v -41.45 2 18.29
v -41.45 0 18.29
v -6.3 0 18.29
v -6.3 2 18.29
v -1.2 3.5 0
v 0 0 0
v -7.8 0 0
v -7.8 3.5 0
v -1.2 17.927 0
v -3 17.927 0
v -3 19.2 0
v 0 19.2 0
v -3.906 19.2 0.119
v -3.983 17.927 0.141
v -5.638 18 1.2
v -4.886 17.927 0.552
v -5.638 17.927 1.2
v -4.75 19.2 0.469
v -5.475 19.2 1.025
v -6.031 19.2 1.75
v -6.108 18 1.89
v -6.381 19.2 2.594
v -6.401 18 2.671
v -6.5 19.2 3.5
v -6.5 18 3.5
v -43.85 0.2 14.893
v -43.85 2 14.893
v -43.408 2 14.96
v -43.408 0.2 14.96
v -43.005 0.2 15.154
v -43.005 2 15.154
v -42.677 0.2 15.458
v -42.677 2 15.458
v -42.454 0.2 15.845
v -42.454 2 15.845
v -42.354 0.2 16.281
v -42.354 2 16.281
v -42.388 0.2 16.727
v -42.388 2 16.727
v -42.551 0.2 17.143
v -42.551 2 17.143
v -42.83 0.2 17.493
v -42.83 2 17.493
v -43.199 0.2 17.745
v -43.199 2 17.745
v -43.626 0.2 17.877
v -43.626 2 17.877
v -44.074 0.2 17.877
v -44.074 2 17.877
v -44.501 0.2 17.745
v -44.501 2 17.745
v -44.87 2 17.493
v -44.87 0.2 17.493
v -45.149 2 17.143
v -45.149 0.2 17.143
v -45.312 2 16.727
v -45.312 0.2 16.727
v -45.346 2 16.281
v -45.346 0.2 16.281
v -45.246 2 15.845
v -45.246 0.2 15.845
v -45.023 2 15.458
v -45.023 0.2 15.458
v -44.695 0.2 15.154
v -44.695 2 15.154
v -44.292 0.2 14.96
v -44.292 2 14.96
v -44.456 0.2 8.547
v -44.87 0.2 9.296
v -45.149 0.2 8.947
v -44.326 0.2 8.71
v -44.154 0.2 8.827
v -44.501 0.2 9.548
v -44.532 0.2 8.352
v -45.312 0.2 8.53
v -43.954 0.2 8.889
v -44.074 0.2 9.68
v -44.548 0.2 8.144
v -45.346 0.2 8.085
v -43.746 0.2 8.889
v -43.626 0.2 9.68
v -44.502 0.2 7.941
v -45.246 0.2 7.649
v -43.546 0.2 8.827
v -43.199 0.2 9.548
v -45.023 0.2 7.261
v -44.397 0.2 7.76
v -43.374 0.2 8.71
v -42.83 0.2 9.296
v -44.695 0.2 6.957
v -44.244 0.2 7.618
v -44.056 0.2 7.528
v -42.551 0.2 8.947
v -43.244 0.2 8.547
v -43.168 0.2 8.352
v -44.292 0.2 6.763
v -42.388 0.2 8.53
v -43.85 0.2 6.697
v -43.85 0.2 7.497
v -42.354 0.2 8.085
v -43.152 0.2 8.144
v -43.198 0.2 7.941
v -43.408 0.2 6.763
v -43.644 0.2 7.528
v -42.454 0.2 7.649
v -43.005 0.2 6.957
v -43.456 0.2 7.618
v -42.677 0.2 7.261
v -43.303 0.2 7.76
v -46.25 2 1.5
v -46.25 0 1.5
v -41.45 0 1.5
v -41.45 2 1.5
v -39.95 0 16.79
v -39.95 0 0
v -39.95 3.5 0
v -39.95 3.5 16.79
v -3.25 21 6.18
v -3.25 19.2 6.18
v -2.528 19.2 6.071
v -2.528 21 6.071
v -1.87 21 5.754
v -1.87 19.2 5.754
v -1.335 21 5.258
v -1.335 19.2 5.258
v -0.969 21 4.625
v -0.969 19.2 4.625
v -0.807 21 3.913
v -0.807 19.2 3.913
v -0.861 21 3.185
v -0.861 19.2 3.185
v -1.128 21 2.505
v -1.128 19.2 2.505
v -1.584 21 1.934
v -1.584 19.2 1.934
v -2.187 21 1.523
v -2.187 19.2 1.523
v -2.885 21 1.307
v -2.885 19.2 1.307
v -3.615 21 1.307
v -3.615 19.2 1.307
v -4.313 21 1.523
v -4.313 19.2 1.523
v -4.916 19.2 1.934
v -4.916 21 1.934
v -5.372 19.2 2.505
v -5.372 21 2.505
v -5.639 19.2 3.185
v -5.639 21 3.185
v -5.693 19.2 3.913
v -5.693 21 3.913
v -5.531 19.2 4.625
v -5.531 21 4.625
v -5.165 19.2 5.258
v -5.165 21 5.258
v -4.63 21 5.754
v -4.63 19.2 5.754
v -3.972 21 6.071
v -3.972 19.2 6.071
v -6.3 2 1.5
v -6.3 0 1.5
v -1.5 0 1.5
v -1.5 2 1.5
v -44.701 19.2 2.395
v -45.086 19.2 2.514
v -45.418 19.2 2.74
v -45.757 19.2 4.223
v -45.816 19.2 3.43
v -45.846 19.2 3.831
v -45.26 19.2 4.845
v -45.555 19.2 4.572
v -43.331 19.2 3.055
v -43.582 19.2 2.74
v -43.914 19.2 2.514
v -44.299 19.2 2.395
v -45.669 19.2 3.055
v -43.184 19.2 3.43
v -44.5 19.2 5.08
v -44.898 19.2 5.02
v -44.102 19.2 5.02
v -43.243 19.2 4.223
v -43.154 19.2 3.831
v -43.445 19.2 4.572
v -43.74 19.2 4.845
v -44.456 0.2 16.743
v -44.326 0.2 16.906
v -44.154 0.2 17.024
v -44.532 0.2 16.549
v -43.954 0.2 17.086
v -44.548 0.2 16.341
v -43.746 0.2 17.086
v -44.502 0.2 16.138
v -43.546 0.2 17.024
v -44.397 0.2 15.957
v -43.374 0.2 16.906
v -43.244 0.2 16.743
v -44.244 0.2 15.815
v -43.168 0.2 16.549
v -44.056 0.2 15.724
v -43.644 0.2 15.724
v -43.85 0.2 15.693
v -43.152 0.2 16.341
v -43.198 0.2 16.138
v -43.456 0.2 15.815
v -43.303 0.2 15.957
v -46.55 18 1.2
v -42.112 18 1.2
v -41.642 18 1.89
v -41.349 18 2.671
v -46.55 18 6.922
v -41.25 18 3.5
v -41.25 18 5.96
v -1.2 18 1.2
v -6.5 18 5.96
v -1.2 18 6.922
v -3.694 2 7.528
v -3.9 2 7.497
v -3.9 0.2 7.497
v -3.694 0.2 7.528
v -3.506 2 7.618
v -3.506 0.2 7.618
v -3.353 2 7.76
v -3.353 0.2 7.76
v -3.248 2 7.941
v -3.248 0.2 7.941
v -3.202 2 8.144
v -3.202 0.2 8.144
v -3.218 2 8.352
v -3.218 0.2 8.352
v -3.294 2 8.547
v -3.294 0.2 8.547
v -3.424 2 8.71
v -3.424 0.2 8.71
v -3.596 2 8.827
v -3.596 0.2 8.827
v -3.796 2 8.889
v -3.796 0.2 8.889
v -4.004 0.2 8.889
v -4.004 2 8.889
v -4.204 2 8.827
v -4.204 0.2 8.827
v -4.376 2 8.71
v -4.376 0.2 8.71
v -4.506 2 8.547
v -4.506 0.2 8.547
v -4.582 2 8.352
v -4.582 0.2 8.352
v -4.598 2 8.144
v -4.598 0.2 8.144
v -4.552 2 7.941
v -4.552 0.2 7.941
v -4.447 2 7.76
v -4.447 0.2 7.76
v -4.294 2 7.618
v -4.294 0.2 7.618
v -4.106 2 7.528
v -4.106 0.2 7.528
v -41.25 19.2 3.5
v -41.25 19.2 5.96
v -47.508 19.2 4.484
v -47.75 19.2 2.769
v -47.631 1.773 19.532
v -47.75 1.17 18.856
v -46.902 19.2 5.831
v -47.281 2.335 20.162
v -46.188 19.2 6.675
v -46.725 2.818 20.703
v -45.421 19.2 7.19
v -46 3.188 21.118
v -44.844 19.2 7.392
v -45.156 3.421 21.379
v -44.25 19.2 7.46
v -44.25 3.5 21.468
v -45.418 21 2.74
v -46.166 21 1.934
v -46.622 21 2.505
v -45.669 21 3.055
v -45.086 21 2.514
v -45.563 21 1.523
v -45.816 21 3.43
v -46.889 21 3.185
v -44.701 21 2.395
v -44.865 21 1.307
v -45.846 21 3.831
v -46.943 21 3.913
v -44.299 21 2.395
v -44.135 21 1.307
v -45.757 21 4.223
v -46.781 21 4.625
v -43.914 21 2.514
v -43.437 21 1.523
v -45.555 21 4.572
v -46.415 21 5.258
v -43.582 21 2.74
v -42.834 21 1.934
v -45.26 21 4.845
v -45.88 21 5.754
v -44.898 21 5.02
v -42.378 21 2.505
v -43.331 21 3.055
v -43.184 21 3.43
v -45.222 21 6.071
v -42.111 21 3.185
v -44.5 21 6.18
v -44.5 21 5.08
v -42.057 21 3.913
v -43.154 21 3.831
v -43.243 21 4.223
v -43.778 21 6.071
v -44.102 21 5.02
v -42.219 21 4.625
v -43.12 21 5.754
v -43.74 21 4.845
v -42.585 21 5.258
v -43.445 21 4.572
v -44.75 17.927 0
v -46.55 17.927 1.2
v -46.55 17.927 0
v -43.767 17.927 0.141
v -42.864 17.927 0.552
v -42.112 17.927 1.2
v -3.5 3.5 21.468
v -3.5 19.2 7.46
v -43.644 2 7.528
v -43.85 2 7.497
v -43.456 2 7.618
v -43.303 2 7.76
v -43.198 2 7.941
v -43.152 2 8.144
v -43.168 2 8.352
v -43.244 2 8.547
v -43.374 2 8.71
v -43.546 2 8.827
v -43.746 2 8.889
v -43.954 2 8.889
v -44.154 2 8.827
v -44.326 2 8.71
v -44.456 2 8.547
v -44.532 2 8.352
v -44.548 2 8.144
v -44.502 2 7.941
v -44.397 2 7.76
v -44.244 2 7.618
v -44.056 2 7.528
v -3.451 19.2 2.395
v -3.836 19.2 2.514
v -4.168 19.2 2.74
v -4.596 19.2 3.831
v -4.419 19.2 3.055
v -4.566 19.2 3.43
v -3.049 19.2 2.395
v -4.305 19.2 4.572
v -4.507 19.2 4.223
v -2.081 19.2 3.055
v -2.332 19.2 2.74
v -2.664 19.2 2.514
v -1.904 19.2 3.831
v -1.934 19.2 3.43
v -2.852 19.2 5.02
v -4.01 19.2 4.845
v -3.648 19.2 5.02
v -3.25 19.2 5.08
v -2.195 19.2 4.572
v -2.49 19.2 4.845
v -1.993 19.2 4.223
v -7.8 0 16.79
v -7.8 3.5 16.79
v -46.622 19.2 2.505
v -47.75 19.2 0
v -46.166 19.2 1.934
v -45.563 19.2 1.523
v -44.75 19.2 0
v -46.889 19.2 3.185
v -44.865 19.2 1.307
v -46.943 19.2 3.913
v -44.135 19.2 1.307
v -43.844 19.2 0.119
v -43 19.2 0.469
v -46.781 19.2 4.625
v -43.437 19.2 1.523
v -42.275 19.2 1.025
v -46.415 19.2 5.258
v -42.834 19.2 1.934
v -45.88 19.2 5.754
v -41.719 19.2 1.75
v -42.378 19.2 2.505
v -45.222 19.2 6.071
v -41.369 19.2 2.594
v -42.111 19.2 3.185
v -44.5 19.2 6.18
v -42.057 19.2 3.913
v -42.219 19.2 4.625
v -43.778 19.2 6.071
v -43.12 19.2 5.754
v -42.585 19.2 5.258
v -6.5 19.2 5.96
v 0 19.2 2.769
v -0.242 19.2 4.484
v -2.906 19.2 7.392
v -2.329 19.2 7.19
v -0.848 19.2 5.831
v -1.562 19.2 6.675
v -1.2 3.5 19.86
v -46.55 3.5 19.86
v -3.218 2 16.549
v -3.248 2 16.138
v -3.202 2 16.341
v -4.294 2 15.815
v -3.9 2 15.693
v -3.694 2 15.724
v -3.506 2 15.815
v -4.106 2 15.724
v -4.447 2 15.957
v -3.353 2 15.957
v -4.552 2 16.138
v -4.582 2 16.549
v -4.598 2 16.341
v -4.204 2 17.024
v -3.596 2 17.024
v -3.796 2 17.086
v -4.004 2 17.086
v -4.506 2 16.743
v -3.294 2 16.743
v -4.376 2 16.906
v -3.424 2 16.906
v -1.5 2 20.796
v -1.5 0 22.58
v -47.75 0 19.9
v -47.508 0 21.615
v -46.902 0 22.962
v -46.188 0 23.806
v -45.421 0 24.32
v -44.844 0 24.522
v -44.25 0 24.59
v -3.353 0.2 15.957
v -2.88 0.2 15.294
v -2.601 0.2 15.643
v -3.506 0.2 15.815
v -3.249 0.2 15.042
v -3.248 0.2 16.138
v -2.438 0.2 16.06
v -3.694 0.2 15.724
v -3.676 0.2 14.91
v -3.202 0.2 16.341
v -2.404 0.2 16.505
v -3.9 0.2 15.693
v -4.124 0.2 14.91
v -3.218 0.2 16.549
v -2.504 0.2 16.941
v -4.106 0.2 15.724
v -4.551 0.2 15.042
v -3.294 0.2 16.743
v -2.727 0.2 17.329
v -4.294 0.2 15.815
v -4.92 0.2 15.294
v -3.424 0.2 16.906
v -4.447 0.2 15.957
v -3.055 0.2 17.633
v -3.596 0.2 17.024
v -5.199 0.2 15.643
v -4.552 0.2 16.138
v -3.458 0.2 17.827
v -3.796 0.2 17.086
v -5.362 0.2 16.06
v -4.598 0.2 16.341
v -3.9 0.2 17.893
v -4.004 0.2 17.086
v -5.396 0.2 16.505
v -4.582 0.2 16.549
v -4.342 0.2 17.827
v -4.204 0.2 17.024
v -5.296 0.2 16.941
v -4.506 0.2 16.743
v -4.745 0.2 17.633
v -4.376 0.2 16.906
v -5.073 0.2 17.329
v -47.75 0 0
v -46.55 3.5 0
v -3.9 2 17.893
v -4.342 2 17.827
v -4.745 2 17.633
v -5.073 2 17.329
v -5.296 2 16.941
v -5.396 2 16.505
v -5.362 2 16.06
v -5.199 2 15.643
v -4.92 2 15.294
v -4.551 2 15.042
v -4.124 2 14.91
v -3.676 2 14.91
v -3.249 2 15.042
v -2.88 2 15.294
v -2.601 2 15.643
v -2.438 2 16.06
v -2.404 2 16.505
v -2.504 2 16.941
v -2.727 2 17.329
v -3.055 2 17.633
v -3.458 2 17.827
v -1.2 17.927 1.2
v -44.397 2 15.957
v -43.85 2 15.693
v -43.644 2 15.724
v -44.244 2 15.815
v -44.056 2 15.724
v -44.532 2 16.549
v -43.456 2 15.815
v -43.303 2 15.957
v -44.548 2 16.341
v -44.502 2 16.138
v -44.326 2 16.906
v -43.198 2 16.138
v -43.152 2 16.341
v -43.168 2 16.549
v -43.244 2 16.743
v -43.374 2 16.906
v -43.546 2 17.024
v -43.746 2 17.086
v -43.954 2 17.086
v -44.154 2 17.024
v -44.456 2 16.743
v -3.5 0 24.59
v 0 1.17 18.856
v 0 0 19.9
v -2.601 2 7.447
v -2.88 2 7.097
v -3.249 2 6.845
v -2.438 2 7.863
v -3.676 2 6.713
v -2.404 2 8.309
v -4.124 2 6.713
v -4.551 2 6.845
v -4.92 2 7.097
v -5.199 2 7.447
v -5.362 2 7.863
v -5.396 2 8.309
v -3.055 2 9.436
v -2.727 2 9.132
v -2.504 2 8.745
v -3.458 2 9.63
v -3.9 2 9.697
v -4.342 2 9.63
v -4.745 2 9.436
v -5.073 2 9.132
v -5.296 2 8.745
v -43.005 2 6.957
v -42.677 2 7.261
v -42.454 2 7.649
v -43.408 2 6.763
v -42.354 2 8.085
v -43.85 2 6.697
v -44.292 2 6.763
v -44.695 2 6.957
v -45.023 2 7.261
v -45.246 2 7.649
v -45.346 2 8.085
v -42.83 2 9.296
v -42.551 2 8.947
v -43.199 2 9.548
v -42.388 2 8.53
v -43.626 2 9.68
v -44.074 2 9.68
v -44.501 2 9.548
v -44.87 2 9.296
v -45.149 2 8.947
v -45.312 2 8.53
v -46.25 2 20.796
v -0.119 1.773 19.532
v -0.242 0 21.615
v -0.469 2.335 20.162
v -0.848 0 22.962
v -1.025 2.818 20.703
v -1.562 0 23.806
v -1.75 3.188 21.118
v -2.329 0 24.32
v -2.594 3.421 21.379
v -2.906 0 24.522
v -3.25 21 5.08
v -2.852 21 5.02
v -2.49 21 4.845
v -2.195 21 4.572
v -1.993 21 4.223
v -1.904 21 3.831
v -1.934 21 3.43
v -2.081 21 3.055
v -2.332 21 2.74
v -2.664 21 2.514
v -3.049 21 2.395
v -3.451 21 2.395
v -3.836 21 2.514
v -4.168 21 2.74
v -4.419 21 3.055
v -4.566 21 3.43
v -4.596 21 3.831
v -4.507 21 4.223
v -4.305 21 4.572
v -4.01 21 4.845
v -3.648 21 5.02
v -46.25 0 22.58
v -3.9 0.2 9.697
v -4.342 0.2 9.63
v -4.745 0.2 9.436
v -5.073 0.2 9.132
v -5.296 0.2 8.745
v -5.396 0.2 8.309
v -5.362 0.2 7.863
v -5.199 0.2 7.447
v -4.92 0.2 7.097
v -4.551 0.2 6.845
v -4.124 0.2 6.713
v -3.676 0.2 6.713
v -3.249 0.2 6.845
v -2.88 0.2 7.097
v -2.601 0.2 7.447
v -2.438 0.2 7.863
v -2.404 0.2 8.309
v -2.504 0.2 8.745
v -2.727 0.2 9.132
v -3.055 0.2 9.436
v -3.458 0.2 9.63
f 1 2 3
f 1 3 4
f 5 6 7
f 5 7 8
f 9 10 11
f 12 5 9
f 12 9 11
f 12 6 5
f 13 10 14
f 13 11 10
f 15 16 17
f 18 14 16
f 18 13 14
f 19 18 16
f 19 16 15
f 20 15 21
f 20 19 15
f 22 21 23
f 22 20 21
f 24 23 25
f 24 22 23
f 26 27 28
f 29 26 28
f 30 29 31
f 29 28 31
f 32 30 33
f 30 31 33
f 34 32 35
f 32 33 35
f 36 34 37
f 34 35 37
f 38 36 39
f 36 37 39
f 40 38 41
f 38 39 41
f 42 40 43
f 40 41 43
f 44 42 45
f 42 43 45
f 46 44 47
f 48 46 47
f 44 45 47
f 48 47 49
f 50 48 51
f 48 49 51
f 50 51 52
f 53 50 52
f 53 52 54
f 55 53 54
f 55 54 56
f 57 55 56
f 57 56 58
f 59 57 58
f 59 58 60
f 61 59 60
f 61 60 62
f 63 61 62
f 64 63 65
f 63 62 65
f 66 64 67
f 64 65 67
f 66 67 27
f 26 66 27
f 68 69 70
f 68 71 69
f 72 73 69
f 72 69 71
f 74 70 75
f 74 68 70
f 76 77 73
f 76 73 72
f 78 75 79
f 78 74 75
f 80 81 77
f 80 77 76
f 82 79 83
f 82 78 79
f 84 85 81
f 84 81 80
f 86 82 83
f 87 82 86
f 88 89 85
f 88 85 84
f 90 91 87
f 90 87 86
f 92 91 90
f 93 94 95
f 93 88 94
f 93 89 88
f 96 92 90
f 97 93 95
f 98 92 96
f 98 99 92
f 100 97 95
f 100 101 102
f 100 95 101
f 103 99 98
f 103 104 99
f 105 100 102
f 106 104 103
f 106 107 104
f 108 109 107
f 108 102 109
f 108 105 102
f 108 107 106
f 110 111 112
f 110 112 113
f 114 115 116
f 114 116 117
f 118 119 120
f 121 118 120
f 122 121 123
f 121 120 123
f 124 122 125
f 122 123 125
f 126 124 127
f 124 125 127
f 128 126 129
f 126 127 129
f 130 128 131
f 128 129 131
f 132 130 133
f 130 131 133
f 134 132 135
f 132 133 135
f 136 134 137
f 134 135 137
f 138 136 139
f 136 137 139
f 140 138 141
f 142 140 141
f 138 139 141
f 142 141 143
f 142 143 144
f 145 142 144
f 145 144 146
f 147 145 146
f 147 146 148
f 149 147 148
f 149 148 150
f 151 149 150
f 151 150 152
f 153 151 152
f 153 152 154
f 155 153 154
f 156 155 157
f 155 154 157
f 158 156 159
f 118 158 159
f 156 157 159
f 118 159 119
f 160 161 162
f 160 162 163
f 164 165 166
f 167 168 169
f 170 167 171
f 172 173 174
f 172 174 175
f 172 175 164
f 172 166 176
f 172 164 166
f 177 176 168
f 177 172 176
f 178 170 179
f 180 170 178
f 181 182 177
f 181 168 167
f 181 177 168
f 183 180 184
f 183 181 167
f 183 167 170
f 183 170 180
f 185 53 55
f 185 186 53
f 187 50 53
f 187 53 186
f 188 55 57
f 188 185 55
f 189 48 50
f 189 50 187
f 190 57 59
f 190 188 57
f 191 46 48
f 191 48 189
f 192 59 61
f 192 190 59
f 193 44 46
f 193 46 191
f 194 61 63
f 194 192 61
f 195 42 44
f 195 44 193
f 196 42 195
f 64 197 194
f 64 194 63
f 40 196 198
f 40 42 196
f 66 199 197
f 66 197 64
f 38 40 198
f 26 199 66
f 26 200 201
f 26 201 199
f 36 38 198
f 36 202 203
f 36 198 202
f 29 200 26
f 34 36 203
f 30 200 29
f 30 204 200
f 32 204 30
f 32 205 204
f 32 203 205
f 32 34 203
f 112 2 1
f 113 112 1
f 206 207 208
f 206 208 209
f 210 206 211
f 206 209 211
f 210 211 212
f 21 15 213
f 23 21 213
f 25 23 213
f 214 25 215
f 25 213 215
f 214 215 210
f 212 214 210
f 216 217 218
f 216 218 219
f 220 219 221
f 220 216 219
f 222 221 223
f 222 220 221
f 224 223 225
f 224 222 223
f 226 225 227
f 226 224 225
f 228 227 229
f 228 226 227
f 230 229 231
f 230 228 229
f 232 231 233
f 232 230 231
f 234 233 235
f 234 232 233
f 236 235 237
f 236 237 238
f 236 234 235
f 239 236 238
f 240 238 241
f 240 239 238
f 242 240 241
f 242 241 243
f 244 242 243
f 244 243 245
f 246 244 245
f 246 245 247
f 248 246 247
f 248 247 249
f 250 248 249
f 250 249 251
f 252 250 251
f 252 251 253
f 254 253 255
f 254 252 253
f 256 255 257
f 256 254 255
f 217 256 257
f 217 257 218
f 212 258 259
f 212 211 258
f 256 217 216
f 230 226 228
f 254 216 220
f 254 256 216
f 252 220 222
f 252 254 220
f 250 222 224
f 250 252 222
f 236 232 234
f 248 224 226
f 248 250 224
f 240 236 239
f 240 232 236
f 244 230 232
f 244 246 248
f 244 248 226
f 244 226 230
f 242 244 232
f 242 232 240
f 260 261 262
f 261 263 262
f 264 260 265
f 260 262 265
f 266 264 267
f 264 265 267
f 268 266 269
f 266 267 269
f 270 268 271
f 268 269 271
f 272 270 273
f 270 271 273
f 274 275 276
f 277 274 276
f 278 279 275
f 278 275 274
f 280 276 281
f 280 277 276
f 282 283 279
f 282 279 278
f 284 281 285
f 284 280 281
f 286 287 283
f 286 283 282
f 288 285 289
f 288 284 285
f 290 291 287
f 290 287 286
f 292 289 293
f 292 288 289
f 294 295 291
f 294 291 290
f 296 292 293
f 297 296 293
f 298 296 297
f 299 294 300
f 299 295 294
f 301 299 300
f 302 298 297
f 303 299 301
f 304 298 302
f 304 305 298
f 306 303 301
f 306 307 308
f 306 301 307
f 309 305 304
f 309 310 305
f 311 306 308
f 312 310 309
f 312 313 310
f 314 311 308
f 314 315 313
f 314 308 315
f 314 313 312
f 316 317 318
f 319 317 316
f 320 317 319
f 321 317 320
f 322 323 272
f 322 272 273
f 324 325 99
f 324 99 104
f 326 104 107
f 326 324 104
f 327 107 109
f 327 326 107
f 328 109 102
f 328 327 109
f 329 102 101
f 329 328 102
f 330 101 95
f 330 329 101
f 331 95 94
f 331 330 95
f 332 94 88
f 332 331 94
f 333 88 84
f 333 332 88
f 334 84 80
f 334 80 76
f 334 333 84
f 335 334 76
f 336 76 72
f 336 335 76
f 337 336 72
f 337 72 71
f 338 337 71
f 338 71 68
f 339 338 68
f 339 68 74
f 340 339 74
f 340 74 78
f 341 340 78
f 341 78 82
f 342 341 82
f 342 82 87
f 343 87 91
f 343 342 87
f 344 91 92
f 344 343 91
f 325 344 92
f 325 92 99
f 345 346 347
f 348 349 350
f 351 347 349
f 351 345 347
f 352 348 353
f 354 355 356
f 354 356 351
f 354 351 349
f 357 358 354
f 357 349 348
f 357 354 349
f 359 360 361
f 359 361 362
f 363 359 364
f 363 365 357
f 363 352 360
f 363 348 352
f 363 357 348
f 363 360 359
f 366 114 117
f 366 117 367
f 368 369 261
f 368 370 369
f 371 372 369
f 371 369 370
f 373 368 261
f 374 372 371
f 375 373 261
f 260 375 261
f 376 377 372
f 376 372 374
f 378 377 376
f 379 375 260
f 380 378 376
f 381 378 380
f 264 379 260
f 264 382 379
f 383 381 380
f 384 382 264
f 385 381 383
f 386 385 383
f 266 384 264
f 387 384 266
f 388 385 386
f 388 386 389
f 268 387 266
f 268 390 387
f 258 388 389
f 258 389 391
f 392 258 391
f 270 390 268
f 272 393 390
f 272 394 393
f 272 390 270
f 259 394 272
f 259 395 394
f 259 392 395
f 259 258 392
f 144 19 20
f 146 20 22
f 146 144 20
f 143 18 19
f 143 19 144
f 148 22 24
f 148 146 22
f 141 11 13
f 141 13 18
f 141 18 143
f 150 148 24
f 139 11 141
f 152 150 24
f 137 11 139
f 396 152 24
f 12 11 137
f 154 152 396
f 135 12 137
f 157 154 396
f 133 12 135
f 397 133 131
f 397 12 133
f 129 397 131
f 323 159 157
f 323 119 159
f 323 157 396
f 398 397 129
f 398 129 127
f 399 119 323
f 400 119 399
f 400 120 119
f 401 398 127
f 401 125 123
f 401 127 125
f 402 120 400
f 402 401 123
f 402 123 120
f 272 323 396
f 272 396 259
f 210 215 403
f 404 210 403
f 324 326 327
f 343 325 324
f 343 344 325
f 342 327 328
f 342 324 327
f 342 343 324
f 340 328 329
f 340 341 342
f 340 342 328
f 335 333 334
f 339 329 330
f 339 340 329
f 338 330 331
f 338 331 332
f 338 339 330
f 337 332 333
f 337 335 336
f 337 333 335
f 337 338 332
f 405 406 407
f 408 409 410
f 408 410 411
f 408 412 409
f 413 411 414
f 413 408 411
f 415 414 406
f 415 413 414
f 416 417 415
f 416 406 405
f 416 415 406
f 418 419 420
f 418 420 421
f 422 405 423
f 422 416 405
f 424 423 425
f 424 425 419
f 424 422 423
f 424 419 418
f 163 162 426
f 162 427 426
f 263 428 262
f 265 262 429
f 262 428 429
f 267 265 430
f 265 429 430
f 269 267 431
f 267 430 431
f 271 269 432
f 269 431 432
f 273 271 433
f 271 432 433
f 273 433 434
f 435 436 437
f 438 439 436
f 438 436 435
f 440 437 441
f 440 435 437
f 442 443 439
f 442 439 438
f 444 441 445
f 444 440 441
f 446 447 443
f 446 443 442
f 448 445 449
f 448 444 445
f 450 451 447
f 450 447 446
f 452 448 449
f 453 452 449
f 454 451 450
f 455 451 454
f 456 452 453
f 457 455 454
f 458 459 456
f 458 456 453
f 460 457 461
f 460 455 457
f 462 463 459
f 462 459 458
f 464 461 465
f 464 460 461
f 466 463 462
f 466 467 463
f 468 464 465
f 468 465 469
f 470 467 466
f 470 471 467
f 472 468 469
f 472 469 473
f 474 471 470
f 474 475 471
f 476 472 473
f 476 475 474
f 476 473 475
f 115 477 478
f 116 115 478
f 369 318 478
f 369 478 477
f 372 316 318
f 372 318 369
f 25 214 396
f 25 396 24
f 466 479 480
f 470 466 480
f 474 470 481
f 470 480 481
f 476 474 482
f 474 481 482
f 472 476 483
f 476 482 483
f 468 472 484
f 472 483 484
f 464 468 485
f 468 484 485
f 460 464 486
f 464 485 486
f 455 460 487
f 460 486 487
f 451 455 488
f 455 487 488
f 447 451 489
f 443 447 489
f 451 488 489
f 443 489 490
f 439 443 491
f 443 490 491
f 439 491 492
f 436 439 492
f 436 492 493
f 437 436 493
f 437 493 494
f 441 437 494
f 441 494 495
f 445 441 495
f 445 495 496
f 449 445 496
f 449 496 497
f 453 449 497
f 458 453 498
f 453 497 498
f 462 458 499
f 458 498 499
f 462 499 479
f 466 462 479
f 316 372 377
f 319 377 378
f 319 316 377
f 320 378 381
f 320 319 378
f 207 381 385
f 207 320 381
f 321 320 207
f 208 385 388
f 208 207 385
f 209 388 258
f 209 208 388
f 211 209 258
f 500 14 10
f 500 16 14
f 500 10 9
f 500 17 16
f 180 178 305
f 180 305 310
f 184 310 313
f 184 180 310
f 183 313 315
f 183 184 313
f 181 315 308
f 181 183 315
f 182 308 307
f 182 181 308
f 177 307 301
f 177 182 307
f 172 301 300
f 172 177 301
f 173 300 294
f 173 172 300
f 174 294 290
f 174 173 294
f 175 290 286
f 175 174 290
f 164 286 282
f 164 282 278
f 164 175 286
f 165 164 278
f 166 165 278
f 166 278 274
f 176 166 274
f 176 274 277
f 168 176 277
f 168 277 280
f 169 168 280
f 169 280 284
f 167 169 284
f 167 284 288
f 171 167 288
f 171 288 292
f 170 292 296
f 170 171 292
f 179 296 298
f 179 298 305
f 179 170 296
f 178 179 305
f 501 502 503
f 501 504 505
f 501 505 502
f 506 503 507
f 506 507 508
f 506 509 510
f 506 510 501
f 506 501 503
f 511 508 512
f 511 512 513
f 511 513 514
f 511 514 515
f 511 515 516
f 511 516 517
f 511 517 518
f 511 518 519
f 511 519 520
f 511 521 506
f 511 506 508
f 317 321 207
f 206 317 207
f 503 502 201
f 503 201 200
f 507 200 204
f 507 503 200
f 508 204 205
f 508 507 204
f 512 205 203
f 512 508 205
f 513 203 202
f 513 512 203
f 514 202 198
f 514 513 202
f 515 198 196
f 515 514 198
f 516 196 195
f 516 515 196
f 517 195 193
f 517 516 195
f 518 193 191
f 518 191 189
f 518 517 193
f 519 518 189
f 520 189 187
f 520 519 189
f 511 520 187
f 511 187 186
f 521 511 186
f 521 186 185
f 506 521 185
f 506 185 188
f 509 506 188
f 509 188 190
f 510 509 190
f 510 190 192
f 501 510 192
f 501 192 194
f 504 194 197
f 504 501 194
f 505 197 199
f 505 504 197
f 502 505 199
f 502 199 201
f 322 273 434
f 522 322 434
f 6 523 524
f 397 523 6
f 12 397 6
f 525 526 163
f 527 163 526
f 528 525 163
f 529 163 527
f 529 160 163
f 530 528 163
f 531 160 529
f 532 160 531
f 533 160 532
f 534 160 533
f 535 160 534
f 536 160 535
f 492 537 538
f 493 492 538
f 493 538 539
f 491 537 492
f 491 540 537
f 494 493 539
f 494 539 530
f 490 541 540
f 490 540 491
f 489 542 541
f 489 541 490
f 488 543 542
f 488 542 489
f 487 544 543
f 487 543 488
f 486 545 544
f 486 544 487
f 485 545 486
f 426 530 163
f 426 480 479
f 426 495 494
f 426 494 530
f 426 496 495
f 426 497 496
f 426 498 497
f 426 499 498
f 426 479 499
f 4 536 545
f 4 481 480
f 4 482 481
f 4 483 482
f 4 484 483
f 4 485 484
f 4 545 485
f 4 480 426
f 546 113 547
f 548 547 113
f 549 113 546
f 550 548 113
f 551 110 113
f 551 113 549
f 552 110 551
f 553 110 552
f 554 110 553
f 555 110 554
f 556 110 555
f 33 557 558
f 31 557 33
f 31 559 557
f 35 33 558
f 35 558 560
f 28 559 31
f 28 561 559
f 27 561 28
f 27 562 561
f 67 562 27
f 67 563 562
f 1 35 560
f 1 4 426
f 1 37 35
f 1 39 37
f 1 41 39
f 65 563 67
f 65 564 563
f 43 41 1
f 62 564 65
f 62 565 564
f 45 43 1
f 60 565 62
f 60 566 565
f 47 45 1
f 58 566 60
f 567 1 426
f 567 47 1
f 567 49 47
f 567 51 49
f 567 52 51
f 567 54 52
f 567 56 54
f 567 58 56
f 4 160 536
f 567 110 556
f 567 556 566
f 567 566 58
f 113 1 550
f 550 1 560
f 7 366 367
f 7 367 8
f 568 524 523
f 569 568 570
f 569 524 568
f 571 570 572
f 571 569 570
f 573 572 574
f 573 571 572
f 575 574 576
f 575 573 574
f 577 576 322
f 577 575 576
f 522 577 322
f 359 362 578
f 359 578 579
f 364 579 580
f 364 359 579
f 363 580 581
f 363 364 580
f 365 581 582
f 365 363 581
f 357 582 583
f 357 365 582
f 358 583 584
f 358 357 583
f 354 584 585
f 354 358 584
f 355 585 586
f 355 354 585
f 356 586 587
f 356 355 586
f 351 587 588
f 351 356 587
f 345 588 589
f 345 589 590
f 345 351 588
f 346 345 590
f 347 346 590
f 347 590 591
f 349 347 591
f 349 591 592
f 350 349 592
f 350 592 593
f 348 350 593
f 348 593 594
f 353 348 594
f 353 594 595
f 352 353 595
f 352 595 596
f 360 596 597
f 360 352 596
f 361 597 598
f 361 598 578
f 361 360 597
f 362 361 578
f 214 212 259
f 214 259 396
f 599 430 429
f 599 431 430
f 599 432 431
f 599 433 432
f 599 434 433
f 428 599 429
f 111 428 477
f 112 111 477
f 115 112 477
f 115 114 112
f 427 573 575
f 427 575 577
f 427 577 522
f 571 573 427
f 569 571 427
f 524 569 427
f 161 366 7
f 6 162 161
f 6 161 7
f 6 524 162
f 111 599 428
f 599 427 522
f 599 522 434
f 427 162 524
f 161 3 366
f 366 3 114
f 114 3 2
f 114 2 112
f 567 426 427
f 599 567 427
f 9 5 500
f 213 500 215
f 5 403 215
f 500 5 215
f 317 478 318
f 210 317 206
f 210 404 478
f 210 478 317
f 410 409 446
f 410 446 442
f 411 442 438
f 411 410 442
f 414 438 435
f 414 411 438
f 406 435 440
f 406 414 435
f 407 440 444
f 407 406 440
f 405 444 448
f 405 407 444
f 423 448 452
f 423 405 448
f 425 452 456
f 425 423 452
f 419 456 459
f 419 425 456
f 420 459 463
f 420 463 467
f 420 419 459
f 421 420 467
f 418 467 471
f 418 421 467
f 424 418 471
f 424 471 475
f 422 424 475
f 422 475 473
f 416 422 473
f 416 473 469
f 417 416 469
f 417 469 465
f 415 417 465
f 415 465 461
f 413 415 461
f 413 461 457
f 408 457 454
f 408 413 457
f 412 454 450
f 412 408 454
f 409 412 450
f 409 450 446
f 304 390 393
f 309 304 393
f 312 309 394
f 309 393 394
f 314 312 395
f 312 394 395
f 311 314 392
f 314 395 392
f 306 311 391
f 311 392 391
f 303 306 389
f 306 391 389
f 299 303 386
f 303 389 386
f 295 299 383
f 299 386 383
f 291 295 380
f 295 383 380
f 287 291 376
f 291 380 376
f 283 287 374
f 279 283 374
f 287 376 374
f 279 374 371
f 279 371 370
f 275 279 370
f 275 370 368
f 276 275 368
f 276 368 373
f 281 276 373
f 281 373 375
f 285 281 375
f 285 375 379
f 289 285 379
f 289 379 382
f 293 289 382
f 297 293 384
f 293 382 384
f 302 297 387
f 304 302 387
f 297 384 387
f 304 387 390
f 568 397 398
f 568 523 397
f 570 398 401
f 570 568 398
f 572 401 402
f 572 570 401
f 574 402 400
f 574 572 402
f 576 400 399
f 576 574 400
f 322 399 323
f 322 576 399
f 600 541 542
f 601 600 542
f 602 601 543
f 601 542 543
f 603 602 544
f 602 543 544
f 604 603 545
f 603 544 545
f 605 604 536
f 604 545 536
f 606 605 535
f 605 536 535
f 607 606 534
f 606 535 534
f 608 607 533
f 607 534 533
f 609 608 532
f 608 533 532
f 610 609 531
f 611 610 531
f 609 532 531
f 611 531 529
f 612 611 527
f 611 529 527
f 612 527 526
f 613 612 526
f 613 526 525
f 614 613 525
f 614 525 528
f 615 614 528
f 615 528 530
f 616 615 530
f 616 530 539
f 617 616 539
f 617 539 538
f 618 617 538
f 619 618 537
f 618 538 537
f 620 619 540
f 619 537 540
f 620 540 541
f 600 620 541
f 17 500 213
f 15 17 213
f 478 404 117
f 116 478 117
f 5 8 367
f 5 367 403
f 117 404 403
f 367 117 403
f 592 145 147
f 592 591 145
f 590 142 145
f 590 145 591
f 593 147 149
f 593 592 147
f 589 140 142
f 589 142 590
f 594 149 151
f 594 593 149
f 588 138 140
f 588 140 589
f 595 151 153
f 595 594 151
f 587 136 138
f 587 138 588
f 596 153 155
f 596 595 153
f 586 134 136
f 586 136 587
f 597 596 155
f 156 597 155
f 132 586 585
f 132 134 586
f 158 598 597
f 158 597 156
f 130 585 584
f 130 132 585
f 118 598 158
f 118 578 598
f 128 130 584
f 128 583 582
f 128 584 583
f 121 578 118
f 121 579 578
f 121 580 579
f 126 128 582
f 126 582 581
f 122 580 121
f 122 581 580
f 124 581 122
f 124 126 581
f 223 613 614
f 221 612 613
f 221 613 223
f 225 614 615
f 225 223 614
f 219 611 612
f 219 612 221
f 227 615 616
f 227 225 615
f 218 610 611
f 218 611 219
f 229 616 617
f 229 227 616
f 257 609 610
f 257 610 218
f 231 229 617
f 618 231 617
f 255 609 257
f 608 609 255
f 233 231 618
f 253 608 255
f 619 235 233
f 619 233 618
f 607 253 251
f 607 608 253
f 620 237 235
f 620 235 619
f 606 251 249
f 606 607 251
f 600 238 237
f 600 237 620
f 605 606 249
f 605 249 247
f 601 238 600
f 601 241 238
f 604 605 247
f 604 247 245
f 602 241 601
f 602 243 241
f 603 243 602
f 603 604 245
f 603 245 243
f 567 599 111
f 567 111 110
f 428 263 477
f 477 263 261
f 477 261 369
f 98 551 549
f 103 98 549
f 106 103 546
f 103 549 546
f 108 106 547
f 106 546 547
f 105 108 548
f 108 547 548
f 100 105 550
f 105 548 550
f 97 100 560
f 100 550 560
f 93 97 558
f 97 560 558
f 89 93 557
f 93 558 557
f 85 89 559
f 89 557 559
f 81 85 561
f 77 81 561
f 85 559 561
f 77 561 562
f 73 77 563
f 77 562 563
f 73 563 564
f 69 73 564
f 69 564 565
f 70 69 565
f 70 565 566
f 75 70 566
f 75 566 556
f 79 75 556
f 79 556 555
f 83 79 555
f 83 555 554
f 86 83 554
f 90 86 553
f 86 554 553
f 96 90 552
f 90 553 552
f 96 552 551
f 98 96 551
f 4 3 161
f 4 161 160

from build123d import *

# Parameters (mm, degrees)
BOSS_EXTRUDE1_DEPTH     = 47.75
SHELL2_T                = -1.2
SKETCH2_W               = 45.35
SKETCH2_H               = 17.927015757
CUT_EXTRUDE1_DEPTH      = 57.531559043
CUT_EXTRUDE2_DEPTH      = 58.038533691
CUT_EXTRUDE2_DEPTH_BACK = 58.038533691
BOSS_EXTRUDE2_DEPTH     = 3.5
CUT_EXTRUDE3_DEPTH      = 58.038533691
SKETCH7_R               = 2.45
SKETCH7_R_2             = 1.35
BOSS_EXTRUDE3_DEPTH     = 1.8
SHELL3_START            = -46.25
SHELL3_DEPTH            = 44.75
SHELL3_2_OUTLINE_W      = 2
SHELL3_2_OUTLINE_H      = 16.790482419
SHELL3_2_DEPTH          = 4.8
SHELL3_START_2          = -6.3
SHELL3_3_OUTLINE_W      = 2
SHELL3_3_OUTLINE_H      = 16.790482419
SHELL3_3_DEPTH          = 4.8
SKETCH8_R               = 1.5
SKETCH8_R_2             = 0.7
BOSS_EXTRUDE4_DEPTH     = 1.8
FILLET1_R               = 3.5


# Read off the part's stored shape, not the designer's step: Shell3
with BuildPart() as part:
    # Sketch1 → Boss-Extrude1 (new body)
    with BuildSketch(Plane(origin=(0, 0, 0), x_dir=(0, 0, -1), z_dir=(1, 0, 0))):
        Polygon((0, 0), (0, 19.2), (-7.46, 19.2), (-24.590482419, 0), align=None)
    extrude(amount=-BOSS_EXTRUDE1_DEPTH)

    # Shell2
    shell2_openings = [part.faces().sort_by_distance(p)[0] for p in [
        (-23.875, 0, 12.29524121),
    ]]
    offset(amount=SHELL2_T, openings=shell2_openings, kind=Kind.INTERSECTION)

    # Sketch2 → Cut-Extrude1 (cut, through all)
    with BuildSketch(Plane.XY.offset(1.2)):
        with Locations((-23.875, 8.963507878)):
            Rectangle(SKETCH2_W, SKETCH2_H)
    extrude(amount=-CUT_EXTRUDE1_DEPTH, mode=Mode.SUBTRACT)

    # Sketch3 → Cut-Extrude2 (cut, two sides: drawn at the far end of the back side and taken through both)
    with BuildSketch(Plane(origin=(0, 19.2, 0), x_dir=(1, 0, 0), z_dir=(0, 1, 0)).offset(-CUT_EXTRUDE2_DEPTH_BACK)):
        Polygon((-41.25, 106.046953634), (-41.25, 0), (-41.25, -5.96), (-6.5, -5.96), (-6.5, 0), (-6.5, 106.046953634), (-6.5, 318.140860903), (-41.25, 318.140860903), align=None)
    extrude(amount=CUT_EXTRUDE2_DEPTH + CUT_EXTRUDE2_DEPTH_BACK, mode=Mode.SUBTRACT)

    # Sketch5 → Boss-Extrude2 (add)
    with BuildSketch(Plane.XZ):
        Polygon((-47.75, 0), (-39.95, 0), (-39.95, 16.790482419), (-7.8, 16.790482419), (-7.8, 0), (0, 0), (0, 24.590482419), (-47.75, 24.590482419), align=None)
    extrude(amount=-BOSS_EXTRUDE2_DEPTH)

    # Sketch6 → Cut-Extrude3 (cut, through all)
    with BuildSketch(Plane.ZY.offset(47.75)):
        Polygon((21.467738228, 3.5), (24.590482419, 0), (24.590482419, 3.5), align=None)
    extrude(amount=-CUT_EXTRUDE3_DEPTH, mode=Mode.SUBTRACT)

    # Sketch7 → Boss-Extrude3 (add)
    # profile 1 of 2: a face of its own
    with BuildSketch(Plane(origin=(0, 19.2, 0), x_dir=(1, 0, 0), z_dir=(0, 1, 0))):
        with Locations(Location((-44.5, -3.73, 0), (0, 0, 270))):
            Circle(SKETCH7_R)
        with Locations(Location((-44.5, -3.73, 0), (0, 0, 270))):
            Circle(SKETCH7_R_2, mode=Mode.SUBTRACT)
    # profile 2 of 2: a face of its own
    with BuildSketch(Plane(origin=(0, 19.2, 0), x_dir=(1, 0, 0), z_dir=(0, 1, 0))):
        with Locations(Location((-3.25, -3.73, 0), (0, 0, 270))):
            Circle(SKETCH7_R)
        with Locations(Location((-3.25, -3.73, 0), (0, 0, 270))):
            Circle(SKETCH7_R_2, mode=Mode.SUBTRACT)
    extrude(amount=BOSS_EXTRUDE3_DEPTH)

    # Shell3 outline → Shell3 (cut)
    with BuildSketch(Plane.YZ.offset(SHELL3_START)):
        Polygon((2, 18.290482419), (2, 20.795809028), (0, 22.58023428), (0, 18.290482419), align=None)
    extrude(amount=SHELL3_DEPTH, mode=Mode.SUBTRACT)

    # Shell3 2 outline → Shell3 2 (cut)
    with BuildSketch(Plane.YZ.offset(SHELL3_START)):
        with Locations((1, 9.895241209)):
            Rectangle(SHELL3_2_OUTLINE_W, SHELL3_2_OUTLINE_H)
    extrude(amount=SHELL3_2_DEPTH, mode=Mode.SUBTRACT)

    # Shell3 3 outline → Shell3 3 (cut)
    with BuildSketch(Plane.YZ.offset(SHELL3_START_2)):
        with Locations((1, 9.895241209)):
            Rectangle(SHELL3_3_OUTLINE_W, SHELL3_3_OUTLINE_H)
    extrude(amount=SHELL3_3_DEPTH, mode=Mode.SUBTRACT)

    # Sketch8 → Boss-Extrude4 (add)
    # profile 1 of 4: a face of its own
    with BuildSketch(Plane.XZ.offset(-2)):
        with Locations(Location((-43.85, 8.196666667, 0), (0, 0, 270))):
            Circle(SKETCH8_R)
        with Locations(Location((-43.85, 8.196666667, 0), (0, 0, 270))):
            Circle(SKETCH8_R_2, mode=Mode.SUBTRACT)
    # profile 2 of 4: a face of its own
    with BuildSketch(Plane.XZ.offset(-2)):
        with Locations(Location((-43.85, 16.393333333, 0), (0, 0, 270))):
            Circle(SKETCH8_R)
        with Locations(Location((-43.85, 16.393333333, 0), (0, 0, 270))):
            Circle(SKETCH8_R_2, mode=Mode.SUBTRACT)
    # profile 3 of 4: a face of its own
    with BuildSketch(Plane.XZ.offset(-2)):
        with Locations(Location((-3.9, 16.393333333, 0), (0, 0, 90))):
            Circle(SKETCH8_R)
        with Locations(Location((-3.9, 16.393333333, 0), (0, 0, 270))):
            Circle(SKETCH8_R_2, mode=Mode.SUBTRACT)
    # profile 4 of 4: a face of its own
    with BuildSketch(Plane.XZ.offset(-2)):
        with Locations(Location((-3.9, 8.196666667, 0), (0, 0, 90))):
            Circle(SKETCH8_R)
        with Locations(Location((-3.9, 8.196666667, 0), (0, 0, 270))):
            Circle(SKETCH8_R_2, mode=Mode.SUBTRACT)
    extrude(amount=BOSS_EXTRUDE4_DEPTH)

    # Fillet1
    fillet1_edges = [part.edges().sort_by_distance(p)[0] for p in [
        (-47.75, 9.6, 16.02524121),
        (0, 9.6, 16.02524121),
        (-41.25, 18.563507879, 0),
        (-6.5, 18.563507879, 0),
    ]]
    fillet(fillet1_edges, radius=FILLET1_R)


solid = part.part
